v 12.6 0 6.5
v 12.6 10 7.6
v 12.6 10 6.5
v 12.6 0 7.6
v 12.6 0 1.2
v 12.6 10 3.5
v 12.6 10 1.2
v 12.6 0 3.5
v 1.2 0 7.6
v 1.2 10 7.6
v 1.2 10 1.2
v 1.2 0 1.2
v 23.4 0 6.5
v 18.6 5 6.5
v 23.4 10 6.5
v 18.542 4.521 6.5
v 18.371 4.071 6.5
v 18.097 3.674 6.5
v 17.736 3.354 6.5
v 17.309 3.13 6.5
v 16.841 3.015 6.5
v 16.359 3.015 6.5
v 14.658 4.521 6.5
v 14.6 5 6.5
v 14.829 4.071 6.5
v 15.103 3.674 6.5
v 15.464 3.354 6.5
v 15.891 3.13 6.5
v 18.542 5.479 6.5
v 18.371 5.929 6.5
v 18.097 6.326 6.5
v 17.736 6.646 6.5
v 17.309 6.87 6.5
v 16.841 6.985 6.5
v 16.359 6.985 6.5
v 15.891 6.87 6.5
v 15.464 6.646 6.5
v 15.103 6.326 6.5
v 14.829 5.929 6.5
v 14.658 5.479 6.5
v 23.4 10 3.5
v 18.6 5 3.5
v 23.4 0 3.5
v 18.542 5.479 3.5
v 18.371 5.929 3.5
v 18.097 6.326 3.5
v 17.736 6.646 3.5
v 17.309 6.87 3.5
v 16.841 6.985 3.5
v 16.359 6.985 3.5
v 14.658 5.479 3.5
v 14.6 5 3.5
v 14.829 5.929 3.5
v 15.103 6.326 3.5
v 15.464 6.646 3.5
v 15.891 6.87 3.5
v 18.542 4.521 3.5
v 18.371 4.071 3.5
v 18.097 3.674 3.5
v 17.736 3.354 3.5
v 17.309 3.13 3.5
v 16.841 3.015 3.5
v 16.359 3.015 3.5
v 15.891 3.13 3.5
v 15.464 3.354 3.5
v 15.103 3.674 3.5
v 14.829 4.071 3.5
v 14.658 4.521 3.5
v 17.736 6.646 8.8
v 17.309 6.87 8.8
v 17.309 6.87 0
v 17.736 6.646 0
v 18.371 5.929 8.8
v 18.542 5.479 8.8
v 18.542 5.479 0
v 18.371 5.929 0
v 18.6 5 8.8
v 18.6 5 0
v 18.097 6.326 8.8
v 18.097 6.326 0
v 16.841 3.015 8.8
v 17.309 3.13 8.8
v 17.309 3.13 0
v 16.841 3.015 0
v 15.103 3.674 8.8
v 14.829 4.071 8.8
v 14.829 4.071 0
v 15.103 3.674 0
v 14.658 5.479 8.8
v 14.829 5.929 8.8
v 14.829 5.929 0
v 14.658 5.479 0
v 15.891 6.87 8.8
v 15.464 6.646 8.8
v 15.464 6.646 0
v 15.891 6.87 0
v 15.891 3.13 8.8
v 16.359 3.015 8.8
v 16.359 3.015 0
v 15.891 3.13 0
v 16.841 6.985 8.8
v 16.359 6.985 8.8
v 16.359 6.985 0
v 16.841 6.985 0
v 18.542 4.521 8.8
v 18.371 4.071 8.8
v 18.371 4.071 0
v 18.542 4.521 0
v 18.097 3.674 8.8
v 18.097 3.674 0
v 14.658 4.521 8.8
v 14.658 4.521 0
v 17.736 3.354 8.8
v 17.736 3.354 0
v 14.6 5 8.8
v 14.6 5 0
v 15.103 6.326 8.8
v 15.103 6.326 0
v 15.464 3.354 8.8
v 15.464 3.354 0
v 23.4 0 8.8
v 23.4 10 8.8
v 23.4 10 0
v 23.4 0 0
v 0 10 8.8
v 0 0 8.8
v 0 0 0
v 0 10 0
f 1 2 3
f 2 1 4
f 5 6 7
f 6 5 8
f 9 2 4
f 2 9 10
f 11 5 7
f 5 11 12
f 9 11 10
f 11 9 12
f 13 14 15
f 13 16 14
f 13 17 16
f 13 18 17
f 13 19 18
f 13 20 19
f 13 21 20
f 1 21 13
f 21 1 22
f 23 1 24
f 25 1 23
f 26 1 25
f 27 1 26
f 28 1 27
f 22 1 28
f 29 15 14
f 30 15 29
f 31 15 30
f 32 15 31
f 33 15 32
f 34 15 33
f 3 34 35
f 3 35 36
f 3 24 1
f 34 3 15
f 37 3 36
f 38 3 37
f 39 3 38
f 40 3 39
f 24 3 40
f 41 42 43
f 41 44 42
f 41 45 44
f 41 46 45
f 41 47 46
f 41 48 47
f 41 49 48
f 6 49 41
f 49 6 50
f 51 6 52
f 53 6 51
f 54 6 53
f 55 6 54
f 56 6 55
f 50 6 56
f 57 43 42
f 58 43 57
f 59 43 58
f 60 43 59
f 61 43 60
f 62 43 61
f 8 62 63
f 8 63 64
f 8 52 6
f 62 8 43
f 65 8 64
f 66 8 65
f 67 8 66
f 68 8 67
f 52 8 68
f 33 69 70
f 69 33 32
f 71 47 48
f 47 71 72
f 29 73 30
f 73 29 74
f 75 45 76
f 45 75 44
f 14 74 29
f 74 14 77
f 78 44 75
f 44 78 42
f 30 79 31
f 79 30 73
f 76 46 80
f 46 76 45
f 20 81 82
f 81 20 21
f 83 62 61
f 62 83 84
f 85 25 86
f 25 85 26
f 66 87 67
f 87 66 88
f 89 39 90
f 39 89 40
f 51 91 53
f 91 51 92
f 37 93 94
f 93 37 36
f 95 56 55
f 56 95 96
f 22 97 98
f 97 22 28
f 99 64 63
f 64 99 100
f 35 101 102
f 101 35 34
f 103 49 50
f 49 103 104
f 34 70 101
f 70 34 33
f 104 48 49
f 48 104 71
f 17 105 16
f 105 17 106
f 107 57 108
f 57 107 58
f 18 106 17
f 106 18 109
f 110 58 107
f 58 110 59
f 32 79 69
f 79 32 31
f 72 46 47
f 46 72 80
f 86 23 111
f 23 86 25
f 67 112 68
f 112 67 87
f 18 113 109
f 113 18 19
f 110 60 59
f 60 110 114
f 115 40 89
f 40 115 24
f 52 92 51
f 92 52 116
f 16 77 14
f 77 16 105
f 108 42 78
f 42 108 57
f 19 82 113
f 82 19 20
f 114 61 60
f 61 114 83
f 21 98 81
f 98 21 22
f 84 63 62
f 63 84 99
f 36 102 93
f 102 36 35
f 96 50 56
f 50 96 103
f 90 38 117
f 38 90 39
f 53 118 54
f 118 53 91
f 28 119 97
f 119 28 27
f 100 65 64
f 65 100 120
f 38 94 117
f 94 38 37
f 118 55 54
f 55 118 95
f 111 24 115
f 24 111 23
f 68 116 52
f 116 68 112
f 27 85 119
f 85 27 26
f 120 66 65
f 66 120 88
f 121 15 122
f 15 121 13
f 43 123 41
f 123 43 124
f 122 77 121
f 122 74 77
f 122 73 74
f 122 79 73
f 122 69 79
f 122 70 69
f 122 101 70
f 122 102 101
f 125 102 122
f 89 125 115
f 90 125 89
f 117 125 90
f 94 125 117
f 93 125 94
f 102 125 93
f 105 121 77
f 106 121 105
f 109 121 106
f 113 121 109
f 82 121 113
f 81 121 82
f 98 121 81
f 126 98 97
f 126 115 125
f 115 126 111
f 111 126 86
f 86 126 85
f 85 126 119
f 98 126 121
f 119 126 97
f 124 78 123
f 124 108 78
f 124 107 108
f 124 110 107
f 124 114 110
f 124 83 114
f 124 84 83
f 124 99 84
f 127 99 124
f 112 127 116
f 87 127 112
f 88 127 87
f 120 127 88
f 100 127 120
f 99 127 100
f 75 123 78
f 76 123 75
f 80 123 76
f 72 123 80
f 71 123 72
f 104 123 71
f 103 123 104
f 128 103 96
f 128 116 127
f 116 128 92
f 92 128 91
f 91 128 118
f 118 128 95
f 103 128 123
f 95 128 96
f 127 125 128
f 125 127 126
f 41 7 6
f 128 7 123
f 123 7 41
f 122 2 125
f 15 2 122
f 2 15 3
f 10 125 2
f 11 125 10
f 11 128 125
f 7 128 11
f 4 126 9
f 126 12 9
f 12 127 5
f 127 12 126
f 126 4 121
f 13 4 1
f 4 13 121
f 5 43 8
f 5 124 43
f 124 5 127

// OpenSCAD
/**
A clamp for a flat wire to be secured to something by being screwed into it ("something" like a wall or 2x4)

2018-01-07
costmo
http://appideas.com
**/

$fa = 4; // minimum angle -- use for final rendering
$fs = 0.5; // minumum size -- use for final rendering

wallThickness = 1.2; // how thick to make the walls
clampWidth = 10; // the width of the entire thing

extraDepth = 12; // how much of an extra "tip" to add for screwing this into something
wireDepth = 11.4; // width of the wire that passes through (called "depth" because that's the dimension it represents in the thing)
depth = wireDepth + extraDepth; // overall depth/length of the thing
wireHeight = 6.4; // height of the wire that passes through
height = wireHeight + (wallThickness * 2); // oevrall height of the thing

pinchGap = 3; // the height of the cutout (distance between landings in the clamp's pinch gap)
pinchOffsetZ = -0.6; // how far off-center to make the cutout. Negative values move it up, positive move it down

holeDiameter = 4; // screw hole diameter
holOffsetY = 2; // bring the hole closer to the wire so it clamps tighter

difference()
{
    {
        // Main body of the thing
        cube( [depth, clampWidth, height] );
    }
    {
        // Remove stuff
        cutouts();
    }
}

module cutouts()
{
    union()
    {
        // Wire pass-through
        translate( [wallThickness, -0.1, wallThickness] )
        {
            cube( [wireDepth, (clampWidth + 0.2), wireHeight] );
        }
    }
    {
        // The "pinch" cutout
        translate( [((wallThickness + wireDepth) - 0.1), -0.1, ((height / 2) - (pinchGap / 2) - pinchOffsetZ)] )
        {
            cube( [extraDepth, (clampWidth + 0.2), pinchGap] );
        }
    }
    {
        // A screw hole
        translate( [((wallThickness + wireDepth) + (extraDepth / 2) - holOffsetY), (clampWidth / 2), -0.1] )
        {
            cylinder( d = holeDiameter, h = (height + 0.2) );
        }

    }
}
